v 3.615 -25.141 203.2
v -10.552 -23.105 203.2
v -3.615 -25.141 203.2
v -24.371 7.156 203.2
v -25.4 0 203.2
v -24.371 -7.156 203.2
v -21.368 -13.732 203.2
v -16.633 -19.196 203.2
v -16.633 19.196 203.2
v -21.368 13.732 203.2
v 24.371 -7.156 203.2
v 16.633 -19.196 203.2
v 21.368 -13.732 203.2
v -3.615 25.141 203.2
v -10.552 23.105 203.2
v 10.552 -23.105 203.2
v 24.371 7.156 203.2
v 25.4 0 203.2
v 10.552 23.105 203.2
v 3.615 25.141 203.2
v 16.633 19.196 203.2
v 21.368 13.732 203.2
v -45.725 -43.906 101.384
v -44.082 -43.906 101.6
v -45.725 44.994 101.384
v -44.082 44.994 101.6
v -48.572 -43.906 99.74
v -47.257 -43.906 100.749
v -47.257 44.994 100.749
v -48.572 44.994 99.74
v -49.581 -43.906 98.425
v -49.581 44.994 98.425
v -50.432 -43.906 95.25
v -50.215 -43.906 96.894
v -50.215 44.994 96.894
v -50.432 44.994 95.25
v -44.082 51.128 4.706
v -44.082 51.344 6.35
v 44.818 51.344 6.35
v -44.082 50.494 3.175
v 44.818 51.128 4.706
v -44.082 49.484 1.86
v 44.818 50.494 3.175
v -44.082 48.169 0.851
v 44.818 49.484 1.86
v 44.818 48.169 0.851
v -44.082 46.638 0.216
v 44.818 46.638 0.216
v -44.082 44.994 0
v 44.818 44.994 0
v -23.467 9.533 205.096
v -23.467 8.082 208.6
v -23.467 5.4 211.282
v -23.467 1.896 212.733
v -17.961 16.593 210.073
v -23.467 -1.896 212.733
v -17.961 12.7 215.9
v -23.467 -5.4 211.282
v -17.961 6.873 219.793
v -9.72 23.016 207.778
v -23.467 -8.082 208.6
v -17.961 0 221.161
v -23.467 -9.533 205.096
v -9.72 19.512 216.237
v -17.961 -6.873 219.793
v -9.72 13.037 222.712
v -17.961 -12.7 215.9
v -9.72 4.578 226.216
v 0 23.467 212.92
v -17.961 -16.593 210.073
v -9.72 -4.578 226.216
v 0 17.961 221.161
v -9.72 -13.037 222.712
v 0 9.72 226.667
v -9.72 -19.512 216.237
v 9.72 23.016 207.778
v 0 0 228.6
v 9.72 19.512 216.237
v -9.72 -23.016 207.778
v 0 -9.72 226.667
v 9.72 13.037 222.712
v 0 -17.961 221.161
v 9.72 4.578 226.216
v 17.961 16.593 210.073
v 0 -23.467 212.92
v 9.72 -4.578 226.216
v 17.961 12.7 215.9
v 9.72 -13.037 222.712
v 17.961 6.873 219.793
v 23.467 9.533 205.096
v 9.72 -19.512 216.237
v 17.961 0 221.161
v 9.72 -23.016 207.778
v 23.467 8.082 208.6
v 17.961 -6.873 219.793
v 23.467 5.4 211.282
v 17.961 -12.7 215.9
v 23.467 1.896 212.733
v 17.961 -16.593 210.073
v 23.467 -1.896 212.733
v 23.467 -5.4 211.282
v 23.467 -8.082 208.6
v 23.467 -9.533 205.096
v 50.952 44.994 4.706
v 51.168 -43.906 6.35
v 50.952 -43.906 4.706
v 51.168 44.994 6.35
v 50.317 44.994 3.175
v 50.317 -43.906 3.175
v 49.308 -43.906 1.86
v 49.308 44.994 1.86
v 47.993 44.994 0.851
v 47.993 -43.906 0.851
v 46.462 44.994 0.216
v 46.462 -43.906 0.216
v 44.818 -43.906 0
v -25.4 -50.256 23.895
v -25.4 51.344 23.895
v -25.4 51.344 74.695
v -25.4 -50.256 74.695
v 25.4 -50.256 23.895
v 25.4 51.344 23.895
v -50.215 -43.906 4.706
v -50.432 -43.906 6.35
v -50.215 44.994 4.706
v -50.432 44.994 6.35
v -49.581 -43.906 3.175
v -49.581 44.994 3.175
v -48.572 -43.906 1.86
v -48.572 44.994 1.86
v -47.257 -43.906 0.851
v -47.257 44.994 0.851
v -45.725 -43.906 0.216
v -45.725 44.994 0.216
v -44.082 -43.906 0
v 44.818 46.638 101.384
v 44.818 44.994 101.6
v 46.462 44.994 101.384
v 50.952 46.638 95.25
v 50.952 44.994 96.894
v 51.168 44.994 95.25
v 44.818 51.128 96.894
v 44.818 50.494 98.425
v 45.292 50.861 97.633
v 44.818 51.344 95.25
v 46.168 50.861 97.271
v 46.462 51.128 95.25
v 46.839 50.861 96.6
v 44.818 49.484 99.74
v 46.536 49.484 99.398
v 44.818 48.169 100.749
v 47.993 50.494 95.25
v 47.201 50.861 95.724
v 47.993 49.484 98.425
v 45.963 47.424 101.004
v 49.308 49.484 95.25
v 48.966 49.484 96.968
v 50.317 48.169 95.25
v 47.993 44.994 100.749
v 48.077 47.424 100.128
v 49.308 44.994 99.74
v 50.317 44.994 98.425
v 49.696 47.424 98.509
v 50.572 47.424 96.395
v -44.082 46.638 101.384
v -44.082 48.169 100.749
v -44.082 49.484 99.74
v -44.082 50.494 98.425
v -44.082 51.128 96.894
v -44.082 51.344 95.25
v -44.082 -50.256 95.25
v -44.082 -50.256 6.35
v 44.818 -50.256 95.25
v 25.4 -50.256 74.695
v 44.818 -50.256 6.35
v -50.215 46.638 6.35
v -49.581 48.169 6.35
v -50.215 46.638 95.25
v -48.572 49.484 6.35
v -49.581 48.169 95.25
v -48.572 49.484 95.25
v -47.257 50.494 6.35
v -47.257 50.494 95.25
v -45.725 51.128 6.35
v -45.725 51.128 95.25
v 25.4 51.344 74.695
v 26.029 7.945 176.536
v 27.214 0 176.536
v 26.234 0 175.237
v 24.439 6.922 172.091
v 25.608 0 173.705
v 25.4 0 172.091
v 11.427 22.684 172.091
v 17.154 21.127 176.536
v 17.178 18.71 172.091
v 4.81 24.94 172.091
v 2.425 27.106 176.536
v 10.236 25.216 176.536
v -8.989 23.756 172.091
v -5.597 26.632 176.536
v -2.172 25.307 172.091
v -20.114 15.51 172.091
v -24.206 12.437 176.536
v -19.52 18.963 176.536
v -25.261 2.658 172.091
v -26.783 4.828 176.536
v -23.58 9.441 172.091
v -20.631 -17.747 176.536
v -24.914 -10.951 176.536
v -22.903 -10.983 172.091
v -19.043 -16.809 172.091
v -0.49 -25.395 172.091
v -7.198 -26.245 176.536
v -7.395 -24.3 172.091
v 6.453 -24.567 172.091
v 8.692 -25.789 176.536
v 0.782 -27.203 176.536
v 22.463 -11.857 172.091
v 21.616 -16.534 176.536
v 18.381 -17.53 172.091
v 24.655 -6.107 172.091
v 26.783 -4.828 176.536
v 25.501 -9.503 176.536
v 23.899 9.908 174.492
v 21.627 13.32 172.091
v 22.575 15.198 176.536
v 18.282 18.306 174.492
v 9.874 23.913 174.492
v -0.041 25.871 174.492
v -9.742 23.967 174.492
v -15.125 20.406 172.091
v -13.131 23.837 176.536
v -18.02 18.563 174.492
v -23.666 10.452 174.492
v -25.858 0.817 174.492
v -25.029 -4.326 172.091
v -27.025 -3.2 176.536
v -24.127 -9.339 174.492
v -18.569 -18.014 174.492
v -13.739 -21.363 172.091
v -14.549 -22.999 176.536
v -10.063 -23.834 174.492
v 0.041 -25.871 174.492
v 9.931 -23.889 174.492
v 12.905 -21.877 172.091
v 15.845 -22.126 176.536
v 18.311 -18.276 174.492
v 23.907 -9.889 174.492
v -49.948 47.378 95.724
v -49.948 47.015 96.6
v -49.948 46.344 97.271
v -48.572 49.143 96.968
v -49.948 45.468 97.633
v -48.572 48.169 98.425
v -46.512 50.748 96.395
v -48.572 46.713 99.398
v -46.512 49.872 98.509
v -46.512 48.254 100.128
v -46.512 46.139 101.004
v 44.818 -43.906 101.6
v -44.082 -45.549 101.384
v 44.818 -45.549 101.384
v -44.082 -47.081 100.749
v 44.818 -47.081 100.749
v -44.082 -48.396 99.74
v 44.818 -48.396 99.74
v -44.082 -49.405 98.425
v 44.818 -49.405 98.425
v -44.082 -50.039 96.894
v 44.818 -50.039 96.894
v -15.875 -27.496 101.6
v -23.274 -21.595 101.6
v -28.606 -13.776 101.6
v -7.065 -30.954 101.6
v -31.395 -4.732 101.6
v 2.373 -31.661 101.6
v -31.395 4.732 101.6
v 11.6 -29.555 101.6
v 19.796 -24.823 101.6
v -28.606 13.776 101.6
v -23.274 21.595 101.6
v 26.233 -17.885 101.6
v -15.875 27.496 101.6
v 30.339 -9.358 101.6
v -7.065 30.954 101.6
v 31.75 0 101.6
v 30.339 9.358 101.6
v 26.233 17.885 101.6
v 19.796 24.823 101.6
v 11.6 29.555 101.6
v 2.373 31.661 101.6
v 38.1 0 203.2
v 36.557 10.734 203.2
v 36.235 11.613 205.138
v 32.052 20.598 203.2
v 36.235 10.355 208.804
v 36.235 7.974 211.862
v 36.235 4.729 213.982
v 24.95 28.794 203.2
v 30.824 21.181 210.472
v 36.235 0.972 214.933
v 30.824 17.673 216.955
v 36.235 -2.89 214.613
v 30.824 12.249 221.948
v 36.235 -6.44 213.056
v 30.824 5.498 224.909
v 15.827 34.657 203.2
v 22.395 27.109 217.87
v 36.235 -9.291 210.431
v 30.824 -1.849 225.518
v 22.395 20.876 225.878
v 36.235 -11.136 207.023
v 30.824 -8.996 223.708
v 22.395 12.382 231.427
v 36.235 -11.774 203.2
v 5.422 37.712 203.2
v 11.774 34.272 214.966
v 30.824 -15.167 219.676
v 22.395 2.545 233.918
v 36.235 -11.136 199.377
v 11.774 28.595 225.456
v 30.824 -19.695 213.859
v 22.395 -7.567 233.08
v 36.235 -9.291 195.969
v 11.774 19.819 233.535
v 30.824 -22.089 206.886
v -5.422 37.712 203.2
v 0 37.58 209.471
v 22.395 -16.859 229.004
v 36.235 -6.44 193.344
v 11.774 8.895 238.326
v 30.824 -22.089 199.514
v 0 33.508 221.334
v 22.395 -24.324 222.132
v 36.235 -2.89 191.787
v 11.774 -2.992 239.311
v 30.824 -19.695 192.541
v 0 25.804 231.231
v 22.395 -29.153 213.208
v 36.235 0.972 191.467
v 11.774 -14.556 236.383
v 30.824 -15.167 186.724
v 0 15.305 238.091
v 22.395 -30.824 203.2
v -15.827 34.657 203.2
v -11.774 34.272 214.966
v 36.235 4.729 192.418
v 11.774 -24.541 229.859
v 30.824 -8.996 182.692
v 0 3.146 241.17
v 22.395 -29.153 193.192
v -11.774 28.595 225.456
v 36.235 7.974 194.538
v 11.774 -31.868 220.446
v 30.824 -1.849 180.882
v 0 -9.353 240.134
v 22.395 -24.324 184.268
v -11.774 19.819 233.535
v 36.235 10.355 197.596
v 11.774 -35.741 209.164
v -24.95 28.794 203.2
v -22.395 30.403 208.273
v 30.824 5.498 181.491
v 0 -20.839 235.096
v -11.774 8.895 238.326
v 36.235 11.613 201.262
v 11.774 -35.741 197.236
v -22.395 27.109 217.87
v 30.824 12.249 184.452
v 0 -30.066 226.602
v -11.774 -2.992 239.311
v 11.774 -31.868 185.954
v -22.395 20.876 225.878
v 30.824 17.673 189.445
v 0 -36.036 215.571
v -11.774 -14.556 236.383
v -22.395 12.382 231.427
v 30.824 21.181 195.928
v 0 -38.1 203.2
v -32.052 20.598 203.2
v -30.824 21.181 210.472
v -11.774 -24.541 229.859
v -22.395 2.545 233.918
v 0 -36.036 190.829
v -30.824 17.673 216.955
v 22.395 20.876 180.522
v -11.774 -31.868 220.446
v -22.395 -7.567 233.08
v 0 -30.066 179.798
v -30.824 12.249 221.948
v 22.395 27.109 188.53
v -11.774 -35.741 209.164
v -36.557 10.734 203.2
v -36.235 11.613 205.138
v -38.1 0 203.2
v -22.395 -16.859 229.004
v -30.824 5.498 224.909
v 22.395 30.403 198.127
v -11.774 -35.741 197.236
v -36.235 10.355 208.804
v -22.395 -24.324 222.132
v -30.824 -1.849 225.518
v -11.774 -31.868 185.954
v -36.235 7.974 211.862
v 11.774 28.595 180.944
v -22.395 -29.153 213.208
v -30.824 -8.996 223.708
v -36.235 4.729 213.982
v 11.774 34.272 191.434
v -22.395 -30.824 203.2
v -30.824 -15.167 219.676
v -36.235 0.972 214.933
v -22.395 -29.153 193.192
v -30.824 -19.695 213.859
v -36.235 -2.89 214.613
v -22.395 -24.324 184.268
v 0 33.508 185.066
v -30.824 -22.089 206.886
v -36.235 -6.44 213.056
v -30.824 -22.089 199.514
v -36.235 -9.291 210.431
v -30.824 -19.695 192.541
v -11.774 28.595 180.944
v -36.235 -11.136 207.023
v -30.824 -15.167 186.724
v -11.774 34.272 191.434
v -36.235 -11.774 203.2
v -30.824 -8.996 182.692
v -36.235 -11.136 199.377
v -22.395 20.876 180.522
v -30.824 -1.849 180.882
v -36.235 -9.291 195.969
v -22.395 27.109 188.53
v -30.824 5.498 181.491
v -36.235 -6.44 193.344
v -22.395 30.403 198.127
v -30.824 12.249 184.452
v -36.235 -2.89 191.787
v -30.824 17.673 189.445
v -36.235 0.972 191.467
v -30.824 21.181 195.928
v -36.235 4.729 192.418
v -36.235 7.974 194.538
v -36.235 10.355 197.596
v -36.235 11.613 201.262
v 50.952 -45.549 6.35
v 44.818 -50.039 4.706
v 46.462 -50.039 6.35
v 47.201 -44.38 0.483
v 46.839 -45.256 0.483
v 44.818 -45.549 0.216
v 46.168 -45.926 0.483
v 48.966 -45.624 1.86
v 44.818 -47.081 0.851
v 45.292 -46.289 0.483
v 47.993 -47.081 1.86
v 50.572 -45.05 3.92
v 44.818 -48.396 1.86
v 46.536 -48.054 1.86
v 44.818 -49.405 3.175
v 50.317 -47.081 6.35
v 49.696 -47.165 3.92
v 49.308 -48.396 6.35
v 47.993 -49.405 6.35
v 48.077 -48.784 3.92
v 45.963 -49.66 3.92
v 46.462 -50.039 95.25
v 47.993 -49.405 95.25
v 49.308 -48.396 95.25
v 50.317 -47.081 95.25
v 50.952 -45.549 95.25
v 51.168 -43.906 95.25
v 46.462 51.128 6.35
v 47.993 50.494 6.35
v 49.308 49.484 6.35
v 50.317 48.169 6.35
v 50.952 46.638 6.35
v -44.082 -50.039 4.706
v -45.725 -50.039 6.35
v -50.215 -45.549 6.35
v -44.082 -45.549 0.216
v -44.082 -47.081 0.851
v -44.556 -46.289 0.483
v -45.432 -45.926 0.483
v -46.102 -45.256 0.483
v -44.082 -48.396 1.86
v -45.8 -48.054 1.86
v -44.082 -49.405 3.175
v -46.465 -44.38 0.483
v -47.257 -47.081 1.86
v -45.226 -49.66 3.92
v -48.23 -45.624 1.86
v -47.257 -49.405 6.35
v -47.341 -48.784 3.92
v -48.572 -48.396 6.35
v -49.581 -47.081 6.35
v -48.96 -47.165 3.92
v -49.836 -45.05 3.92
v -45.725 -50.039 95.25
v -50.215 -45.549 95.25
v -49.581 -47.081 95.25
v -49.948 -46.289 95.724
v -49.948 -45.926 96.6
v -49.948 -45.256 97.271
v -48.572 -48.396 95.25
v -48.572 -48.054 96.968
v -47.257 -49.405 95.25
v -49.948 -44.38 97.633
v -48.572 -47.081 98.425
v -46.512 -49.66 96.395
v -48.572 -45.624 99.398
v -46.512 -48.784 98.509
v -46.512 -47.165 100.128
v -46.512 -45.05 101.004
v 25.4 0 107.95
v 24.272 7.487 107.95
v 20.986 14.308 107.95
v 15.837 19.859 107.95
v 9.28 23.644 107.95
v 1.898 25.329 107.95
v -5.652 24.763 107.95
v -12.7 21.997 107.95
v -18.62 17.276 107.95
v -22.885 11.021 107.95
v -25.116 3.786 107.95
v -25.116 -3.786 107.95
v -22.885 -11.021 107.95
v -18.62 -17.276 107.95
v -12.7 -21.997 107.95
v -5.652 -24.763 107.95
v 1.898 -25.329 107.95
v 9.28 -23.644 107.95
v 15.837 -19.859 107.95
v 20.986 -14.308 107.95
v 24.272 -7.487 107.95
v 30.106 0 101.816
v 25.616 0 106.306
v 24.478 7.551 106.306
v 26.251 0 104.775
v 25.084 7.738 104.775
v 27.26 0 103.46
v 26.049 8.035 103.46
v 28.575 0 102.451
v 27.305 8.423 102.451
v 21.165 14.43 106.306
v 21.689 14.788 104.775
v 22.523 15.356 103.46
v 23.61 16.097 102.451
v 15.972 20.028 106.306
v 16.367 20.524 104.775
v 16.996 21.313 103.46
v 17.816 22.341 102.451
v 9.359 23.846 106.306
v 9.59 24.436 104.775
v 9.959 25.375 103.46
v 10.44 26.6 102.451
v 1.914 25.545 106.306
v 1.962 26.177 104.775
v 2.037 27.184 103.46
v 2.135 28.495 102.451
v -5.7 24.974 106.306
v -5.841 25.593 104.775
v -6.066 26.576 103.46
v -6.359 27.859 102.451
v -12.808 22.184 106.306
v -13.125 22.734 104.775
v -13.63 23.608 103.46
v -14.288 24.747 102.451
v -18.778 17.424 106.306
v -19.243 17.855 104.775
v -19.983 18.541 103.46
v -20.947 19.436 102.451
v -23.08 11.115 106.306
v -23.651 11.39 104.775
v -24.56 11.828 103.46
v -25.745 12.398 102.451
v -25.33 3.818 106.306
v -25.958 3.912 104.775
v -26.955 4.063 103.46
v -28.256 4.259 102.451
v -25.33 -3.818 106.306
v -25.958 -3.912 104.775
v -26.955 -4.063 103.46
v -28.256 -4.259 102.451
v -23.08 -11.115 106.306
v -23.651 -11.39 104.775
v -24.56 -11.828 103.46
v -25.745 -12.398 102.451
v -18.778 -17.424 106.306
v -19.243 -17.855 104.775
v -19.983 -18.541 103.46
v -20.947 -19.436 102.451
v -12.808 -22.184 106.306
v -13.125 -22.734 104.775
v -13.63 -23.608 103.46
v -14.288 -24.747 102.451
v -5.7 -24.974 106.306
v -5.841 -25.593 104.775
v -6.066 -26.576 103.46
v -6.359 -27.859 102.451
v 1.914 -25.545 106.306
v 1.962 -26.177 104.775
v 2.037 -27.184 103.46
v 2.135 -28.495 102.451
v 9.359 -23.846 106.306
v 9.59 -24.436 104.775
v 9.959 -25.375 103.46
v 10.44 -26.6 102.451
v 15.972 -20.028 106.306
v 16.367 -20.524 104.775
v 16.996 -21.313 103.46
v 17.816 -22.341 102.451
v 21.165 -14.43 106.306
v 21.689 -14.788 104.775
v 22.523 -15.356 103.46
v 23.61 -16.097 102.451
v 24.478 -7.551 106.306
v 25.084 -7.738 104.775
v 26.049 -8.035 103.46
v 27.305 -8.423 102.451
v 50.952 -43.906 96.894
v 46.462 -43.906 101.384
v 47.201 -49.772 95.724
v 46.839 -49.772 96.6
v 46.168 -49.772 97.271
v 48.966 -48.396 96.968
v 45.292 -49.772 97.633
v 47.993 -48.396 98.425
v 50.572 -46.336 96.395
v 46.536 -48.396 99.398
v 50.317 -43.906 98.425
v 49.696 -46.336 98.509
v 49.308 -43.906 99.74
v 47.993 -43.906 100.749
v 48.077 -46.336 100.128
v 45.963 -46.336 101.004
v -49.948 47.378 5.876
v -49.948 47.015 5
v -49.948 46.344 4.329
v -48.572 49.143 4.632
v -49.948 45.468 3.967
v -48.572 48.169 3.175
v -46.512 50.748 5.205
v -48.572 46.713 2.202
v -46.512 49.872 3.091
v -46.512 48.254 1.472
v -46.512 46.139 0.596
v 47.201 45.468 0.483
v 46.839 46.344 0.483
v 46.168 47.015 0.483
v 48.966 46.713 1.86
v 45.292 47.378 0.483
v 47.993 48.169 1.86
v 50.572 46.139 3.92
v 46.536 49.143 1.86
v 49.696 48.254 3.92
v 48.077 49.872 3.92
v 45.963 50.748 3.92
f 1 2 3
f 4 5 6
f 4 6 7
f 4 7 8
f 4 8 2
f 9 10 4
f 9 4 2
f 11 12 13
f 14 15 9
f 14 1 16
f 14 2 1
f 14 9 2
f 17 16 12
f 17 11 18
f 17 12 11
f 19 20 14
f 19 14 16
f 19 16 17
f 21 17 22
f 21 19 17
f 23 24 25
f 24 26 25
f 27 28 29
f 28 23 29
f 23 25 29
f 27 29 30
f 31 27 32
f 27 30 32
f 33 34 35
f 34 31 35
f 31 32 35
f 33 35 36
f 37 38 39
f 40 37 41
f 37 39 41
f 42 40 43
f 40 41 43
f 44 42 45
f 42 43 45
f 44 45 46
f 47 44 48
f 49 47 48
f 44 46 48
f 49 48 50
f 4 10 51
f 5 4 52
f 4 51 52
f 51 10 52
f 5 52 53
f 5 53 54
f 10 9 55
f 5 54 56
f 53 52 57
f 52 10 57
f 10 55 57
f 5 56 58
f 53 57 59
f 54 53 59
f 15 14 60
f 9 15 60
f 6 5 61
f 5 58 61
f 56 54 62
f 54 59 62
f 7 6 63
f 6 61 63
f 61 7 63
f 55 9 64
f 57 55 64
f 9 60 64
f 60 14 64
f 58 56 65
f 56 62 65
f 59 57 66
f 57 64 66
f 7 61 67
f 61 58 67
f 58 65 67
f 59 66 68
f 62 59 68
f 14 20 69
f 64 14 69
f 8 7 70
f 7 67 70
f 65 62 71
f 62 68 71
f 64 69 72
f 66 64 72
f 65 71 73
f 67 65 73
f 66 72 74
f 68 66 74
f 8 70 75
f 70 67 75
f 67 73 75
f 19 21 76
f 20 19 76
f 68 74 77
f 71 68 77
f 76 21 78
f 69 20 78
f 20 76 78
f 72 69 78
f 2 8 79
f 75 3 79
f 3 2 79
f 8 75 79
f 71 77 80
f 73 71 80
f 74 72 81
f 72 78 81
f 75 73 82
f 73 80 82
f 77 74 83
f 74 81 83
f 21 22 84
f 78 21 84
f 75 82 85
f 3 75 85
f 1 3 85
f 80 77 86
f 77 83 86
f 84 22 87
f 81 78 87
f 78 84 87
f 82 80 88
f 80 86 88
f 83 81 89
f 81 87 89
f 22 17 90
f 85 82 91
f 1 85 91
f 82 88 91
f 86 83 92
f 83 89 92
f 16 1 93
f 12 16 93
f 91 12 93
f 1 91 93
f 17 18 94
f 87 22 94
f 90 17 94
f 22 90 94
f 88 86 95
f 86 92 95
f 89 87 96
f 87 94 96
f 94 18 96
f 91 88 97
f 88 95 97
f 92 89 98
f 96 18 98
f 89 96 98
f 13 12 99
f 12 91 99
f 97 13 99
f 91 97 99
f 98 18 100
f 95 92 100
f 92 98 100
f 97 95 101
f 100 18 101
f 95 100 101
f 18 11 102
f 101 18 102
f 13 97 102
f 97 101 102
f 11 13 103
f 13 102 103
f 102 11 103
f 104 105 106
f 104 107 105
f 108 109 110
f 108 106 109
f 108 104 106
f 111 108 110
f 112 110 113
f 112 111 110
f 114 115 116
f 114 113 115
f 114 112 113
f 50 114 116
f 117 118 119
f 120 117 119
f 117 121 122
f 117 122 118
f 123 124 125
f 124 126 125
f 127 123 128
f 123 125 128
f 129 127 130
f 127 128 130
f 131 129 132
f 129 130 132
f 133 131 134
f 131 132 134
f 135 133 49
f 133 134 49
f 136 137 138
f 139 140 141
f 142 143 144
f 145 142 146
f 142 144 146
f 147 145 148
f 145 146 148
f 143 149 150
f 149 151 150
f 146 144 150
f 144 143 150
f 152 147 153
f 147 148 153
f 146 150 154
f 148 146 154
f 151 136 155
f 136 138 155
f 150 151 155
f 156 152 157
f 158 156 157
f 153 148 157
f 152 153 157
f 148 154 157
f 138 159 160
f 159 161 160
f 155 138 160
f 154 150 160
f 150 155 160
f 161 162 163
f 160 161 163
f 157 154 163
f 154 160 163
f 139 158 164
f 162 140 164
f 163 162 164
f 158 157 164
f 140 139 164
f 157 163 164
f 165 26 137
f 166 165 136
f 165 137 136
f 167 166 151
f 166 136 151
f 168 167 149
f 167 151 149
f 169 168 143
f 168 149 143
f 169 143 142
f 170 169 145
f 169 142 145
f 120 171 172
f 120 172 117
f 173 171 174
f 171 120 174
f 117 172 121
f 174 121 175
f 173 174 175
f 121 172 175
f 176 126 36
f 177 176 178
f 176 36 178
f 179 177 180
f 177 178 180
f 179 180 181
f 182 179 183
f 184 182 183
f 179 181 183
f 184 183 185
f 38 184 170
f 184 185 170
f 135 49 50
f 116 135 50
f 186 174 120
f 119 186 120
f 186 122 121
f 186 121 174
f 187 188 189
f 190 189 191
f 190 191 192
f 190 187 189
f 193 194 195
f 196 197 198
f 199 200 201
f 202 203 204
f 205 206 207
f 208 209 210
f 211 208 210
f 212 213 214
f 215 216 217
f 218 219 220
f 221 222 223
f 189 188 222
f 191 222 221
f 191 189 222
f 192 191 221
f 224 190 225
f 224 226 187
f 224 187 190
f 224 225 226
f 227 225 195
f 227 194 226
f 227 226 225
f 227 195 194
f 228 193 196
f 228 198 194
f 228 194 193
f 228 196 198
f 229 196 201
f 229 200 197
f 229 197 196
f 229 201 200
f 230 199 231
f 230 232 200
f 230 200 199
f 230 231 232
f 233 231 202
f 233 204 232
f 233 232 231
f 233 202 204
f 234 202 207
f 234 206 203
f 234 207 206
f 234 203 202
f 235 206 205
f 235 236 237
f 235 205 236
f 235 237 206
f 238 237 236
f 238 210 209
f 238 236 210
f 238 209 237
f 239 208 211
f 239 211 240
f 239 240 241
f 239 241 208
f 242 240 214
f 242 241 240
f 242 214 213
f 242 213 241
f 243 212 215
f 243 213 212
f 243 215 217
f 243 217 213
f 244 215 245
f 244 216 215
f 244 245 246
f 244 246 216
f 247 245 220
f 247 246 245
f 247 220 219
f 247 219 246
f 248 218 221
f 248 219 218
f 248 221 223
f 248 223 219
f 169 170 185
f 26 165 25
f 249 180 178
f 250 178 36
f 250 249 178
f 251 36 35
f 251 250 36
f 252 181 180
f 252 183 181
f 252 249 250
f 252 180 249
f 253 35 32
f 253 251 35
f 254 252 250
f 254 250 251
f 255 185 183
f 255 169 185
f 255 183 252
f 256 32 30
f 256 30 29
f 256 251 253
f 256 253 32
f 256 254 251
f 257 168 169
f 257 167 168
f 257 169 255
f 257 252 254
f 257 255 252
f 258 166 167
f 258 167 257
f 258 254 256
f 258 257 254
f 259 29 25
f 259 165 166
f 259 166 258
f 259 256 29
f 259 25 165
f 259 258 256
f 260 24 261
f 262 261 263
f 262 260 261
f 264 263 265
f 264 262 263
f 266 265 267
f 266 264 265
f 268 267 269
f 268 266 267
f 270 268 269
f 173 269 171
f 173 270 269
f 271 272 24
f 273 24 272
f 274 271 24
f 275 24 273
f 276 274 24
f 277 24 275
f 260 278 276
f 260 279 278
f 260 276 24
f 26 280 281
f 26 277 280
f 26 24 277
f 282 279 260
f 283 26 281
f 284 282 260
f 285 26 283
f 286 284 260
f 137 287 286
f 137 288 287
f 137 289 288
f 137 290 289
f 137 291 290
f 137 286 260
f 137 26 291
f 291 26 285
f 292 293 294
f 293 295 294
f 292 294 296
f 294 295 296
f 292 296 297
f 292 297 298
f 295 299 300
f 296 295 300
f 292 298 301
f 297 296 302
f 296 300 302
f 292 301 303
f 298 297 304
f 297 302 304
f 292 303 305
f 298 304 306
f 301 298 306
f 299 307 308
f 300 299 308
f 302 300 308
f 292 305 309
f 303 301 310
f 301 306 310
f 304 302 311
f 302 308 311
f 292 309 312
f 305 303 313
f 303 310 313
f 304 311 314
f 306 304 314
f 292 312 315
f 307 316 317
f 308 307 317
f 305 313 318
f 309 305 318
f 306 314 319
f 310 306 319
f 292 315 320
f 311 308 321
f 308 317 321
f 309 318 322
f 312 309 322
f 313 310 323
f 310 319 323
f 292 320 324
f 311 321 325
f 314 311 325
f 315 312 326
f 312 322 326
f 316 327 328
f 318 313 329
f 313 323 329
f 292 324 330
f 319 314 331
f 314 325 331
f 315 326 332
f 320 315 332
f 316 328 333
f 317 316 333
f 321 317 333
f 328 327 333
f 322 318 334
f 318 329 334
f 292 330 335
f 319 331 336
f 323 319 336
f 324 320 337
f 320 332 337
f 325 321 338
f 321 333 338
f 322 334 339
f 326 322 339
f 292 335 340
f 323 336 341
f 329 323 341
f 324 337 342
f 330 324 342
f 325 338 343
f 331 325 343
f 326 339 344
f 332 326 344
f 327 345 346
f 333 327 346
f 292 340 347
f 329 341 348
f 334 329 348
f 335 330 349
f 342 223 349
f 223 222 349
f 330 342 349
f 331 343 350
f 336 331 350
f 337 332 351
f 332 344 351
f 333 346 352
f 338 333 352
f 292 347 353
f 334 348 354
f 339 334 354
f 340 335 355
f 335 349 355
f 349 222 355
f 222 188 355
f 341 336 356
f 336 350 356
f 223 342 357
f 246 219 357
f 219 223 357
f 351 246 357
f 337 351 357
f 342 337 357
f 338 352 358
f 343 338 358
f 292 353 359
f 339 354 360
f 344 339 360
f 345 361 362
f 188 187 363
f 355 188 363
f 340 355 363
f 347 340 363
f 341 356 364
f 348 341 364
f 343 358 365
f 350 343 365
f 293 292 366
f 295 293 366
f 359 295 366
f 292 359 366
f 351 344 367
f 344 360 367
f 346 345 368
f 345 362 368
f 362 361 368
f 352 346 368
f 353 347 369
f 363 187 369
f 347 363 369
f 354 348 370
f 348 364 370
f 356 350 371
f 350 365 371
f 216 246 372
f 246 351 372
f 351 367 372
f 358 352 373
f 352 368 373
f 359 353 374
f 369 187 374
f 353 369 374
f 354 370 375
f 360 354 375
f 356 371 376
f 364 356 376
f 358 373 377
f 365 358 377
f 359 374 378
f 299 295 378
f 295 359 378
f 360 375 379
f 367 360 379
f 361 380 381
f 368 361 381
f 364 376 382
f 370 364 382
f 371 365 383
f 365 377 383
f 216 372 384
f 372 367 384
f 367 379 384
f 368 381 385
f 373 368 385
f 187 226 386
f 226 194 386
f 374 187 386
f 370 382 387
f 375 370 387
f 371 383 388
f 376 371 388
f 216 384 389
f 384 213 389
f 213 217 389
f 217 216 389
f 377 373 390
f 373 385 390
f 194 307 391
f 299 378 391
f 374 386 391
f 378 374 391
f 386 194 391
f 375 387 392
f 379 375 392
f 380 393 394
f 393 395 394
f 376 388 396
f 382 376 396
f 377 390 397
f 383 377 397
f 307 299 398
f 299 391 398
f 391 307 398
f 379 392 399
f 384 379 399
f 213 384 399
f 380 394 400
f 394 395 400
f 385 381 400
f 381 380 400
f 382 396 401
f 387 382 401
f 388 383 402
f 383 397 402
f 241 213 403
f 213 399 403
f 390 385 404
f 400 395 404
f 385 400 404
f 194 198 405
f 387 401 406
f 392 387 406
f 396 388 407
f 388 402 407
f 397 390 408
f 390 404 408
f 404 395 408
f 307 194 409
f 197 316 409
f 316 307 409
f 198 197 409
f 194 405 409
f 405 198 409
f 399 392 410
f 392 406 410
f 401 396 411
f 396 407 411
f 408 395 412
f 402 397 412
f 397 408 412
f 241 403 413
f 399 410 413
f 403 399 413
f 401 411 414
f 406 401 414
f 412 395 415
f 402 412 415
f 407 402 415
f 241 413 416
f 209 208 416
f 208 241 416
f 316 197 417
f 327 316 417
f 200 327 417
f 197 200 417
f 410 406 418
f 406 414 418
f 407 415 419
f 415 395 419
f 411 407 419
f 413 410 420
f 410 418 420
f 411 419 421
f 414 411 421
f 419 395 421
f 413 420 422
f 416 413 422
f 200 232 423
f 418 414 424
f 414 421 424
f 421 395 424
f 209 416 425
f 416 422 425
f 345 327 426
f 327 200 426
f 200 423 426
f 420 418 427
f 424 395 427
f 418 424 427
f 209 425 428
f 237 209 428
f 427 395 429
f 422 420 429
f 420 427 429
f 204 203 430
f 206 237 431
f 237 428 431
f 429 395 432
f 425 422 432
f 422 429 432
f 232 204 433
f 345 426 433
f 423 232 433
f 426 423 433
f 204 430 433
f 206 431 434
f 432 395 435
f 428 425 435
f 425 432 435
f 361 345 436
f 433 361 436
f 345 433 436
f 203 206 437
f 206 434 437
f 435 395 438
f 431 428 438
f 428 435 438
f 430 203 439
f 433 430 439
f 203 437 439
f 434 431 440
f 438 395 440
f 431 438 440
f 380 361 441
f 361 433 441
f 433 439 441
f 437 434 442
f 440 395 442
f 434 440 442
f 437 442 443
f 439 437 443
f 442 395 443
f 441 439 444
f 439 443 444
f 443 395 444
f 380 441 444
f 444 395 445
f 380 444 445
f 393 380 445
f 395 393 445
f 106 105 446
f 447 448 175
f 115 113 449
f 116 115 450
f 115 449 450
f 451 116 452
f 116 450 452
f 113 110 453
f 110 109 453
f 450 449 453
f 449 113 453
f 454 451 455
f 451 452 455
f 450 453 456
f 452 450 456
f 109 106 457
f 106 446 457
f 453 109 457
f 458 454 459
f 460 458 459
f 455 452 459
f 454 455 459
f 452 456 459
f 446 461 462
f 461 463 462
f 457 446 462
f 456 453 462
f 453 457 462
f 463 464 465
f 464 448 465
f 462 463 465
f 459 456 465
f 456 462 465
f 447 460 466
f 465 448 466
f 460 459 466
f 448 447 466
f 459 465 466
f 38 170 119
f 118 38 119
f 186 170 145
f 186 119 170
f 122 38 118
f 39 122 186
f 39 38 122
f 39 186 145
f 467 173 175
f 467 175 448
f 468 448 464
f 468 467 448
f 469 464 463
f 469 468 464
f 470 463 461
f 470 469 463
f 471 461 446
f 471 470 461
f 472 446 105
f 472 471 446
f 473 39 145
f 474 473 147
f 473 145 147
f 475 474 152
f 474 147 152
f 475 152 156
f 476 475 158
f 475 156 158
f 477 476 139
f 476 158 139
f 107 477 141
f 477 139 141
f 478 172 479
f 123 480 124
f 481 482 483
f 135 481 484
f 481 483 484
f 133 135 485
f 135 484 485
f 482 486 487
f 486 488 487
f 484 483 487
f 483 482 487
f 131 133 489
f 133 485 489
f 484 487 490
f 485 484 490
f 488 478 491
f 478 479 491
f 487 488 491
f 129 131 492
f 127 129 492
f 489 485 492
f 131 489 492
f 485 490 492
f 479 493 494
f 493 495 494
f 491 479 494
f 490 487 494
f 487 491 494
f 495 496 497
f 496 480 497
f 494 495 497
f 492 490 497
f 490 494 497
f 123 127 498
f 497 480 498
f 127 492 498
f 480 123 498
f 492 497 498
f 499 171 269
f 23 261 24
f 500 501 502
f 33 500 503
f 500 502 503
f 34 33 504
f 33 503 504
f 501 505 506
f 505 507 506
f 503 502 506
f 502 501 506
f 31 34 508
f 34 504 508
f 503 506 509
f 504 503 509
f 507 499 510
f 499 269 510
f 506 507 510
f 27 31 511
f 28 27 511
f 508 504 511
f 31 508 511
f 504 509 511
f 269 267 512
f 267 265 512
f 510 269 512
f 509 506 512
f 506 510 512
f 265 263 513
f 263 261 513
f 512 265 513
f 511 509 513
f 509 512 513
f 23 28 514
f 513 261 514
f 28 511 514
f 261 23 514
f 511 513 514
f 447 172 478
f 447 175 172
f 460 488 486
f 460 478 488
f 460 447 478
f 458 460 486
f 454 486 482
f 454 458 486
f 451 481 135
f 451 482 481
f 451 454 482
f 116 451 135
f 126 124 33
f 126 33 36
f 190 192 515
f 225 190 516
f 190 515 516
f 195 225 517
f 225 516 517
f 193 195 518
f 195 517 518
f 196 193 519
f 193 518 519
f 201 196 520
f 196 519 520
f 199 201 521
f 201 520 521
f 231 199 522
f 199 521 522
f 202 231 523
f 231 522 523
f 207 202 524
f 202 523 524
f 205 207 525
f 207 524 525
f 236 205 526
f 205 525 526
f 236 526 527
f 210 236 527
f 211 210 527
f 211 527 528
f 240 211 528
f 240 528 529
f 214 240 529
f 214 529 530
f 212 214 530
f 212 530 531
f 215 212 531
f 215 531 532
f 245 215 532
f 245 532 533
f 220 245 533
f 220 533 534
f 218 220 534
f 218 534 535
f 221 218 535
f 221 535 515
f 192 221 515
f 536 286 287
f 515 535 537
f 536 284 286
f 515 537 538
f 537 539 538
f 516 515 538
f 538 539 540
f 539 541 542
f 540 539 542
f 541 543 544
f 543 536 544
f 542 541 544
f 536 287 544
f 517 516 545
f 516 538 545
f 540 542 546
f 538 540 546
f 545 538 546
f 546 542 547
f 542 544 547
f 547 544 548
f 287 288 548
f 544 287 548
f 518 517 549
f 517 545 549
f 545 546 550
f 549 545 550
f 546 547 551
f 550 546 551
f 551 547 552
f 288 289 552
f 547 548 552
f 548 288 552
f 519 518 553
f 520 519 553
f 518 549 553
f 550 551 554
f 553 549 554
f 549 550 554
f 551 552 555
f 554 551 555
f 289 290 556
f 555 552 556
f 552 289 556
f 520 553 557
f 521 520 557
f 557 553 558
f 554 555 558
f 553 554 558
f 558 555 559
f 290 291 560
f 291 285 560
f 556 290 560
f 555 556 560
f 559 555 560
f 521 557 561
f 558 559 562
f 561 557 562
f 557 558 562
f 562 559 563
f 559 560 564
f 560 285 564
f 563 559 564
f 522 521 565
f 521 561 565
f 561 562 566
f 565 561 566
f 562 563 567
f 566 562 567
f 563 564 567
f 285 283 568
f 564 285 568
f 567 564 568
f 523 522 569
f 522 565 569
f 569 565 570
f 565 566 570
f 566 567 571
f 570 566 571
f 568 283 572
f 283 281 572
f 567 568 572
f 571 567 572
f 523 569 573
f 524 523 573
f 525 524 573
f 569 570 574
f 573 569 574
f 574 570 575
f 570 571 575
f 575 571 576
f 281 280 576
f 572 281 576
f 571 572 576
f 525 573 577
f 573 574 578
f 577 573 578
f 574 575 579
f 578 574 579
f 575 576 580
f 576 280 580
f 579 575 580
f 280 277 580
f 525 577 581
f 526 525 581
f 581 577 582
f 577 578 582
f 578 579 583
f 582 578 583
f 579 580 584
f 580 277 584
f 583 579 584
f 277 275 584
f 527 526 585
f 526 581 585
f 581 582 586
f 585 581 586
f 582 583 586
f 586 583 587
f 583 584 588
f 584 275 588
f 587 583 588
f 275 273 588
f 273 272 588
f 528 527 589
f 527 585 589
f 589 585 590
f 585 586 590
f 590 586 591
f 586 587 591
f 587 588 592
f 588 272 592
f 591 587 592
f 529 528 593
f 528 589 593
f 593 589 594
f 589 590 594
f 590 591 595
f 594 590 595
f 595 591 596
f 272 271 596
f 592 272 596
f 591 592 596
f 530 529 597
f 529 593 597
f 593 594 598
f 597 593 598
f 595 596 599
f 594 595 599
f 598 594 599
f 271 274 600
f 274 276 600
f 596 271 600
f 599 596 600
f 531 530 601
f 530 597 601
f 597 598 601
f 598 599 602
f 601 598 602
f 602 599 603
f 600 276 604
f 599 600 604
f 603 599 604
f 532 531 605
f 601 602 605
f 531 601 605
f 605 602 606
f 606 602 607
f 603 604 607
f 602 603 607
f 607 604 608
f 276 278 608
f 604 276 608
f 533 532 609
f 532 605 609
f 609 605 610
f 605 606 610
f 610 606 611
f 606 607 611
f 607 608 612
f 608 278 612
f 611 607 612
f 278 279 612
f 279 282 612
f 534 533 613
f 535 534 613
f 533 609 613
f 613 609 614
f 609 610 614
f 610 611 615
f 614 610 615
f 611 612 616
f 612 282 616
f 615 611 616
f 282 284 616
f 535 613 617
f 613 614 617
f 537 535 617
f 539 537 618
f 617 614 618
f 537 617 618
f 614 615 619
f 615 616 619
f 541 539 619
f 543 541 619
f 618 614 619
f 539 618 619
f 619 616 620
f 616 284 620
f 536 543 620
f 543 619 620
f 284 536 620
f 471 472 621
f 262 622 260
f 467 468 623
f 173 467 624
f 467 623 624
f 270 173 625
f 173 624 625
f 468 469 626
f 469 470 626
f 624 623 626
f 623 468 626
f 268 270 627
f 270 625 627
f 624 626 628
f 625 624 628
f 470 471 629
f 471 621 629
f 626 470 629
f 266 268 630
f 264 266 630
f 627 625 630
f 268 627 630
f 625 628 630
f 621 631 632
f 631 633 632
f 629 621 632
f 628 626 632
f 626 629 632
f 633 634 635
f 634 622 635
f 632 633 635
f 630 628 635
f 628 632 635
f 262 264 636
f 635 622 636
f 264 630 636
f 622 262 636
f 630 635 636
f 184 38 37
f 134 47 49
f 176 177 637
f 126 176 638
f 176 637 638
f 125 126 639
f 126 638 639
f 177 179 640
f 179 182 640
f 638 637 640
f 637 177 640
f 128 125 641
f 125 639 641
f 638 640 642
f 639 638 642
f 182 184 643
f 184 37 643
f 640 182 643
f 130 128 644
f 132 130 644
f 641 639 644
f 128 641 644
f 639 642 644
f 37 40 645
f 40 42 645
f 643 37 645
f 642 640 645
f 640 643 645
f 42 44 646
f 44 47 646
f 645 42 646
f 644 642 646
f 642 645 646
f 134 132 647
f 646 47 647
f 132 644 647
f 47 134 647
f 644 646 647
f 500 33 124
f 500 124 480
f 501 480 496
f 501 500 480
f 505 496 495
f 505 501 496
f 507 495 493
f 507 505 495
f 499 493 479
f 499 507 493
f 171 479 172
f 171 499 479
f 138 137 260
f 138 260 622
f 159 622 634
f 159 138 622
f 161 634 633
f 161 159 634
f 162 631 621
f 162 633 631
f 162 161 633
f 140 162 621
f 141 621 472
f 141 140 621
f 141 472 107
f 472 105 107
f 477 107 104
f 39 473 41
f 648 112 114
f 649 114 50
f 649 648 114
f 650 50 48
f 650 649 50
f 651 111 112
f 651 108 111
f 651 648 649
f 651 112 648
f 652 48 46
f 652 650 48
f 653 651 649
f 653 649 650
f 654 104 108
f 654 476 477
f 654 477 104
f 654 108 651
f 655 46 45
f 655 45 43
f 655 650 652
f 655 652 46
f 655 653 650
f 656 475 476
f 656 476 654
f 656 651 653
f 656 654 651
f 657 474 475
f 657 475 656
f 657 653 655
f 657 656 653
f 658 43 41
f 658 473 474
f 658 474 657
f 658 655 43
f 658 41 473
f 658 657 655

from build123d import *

# Parameters (mm, degrees)
F0_W     = 101.6
F0_H     = 101.6
F1_DEPTH = 101.6
F2_R     = 25.4
F3_DEPTH = 101.6
F6_W     = 50.8
F6_H     = 50.8
F7_DEPTH = 101.6
F8_R     = 6.35


with BuildPart() as f1:
    # F0 (on Top) → F1 (new body)
    with BuildSketch(Plane.XY):
        with Locations((0.3681425005, 0.5443057779)):
            Rectangle(F0_W, F0_H)
    extrude(amount=F1_DEPTH)

    # F2 (on face) → F3 (join)
    with BuildSketch(Plane.XY.offset(101.6)):
        Circle(F2_R)
    extrude(amount=F3_DEPTH)

    # F4 (on face) → F5 (revolve)
    with BuildSketch(Plane.XY.offset(203.2)):
        with BuildLine():
            Line((25.4, 0), (38.1, 0))
            ThreePointArc((38.1, 0), (0, 38.1), (-38.1, 0))
            Line((-38.1, 0), (-25.4, 0))
            ThreePointArc((-25.4, 0), (0, 25.4), (25.4, 0))
        make_face()
    revolve(axis=Axis((0, 0, 203.2), (1, 0, 0)))

    # F6 (on face) → F7 (cut)
    with BuildSketch(Plane(origin=(0, 51.3443057779, 0), x_dir=(-1, 0, 0), z_dir=(0, 1, 0))):
        with Locations((0, 49.2945600852)):
            Rectangle(F6_W, F6_H)
    extrude(amount=-F7_DEPTH, mode=Mode.SUBTRACT)

    # F8
    f8_edges = [f1.edges().sort_by_distance(p)[0] for p in [
        (51.168143, 0.544306, 101.6),
        (0.368143, 51.344306, 101.6),
        (51.168143, -50.255694, 50.8),
        (51.168143, 51.344306, 50.8),
        (51.168143, 0.544306, 0),
        (0.368143, 51.344306, 0),
        (-50.431857, 51.344306, 50.8),
        (-25.4, 0, 174.801937),
        (-25.4, 0, 101.6),
        (0.368143, -50.255694, 101.6),
        (-50.431857, -50.255694, 50.8),
        (0.368143, -50.255694, 0),
        (-50.431857, 0.544306, 101.6),
        (-50.431857, 0.544306, 0),
    ]]
    fillet(f8_edges, radius=F8_R)


solid = f1.part
